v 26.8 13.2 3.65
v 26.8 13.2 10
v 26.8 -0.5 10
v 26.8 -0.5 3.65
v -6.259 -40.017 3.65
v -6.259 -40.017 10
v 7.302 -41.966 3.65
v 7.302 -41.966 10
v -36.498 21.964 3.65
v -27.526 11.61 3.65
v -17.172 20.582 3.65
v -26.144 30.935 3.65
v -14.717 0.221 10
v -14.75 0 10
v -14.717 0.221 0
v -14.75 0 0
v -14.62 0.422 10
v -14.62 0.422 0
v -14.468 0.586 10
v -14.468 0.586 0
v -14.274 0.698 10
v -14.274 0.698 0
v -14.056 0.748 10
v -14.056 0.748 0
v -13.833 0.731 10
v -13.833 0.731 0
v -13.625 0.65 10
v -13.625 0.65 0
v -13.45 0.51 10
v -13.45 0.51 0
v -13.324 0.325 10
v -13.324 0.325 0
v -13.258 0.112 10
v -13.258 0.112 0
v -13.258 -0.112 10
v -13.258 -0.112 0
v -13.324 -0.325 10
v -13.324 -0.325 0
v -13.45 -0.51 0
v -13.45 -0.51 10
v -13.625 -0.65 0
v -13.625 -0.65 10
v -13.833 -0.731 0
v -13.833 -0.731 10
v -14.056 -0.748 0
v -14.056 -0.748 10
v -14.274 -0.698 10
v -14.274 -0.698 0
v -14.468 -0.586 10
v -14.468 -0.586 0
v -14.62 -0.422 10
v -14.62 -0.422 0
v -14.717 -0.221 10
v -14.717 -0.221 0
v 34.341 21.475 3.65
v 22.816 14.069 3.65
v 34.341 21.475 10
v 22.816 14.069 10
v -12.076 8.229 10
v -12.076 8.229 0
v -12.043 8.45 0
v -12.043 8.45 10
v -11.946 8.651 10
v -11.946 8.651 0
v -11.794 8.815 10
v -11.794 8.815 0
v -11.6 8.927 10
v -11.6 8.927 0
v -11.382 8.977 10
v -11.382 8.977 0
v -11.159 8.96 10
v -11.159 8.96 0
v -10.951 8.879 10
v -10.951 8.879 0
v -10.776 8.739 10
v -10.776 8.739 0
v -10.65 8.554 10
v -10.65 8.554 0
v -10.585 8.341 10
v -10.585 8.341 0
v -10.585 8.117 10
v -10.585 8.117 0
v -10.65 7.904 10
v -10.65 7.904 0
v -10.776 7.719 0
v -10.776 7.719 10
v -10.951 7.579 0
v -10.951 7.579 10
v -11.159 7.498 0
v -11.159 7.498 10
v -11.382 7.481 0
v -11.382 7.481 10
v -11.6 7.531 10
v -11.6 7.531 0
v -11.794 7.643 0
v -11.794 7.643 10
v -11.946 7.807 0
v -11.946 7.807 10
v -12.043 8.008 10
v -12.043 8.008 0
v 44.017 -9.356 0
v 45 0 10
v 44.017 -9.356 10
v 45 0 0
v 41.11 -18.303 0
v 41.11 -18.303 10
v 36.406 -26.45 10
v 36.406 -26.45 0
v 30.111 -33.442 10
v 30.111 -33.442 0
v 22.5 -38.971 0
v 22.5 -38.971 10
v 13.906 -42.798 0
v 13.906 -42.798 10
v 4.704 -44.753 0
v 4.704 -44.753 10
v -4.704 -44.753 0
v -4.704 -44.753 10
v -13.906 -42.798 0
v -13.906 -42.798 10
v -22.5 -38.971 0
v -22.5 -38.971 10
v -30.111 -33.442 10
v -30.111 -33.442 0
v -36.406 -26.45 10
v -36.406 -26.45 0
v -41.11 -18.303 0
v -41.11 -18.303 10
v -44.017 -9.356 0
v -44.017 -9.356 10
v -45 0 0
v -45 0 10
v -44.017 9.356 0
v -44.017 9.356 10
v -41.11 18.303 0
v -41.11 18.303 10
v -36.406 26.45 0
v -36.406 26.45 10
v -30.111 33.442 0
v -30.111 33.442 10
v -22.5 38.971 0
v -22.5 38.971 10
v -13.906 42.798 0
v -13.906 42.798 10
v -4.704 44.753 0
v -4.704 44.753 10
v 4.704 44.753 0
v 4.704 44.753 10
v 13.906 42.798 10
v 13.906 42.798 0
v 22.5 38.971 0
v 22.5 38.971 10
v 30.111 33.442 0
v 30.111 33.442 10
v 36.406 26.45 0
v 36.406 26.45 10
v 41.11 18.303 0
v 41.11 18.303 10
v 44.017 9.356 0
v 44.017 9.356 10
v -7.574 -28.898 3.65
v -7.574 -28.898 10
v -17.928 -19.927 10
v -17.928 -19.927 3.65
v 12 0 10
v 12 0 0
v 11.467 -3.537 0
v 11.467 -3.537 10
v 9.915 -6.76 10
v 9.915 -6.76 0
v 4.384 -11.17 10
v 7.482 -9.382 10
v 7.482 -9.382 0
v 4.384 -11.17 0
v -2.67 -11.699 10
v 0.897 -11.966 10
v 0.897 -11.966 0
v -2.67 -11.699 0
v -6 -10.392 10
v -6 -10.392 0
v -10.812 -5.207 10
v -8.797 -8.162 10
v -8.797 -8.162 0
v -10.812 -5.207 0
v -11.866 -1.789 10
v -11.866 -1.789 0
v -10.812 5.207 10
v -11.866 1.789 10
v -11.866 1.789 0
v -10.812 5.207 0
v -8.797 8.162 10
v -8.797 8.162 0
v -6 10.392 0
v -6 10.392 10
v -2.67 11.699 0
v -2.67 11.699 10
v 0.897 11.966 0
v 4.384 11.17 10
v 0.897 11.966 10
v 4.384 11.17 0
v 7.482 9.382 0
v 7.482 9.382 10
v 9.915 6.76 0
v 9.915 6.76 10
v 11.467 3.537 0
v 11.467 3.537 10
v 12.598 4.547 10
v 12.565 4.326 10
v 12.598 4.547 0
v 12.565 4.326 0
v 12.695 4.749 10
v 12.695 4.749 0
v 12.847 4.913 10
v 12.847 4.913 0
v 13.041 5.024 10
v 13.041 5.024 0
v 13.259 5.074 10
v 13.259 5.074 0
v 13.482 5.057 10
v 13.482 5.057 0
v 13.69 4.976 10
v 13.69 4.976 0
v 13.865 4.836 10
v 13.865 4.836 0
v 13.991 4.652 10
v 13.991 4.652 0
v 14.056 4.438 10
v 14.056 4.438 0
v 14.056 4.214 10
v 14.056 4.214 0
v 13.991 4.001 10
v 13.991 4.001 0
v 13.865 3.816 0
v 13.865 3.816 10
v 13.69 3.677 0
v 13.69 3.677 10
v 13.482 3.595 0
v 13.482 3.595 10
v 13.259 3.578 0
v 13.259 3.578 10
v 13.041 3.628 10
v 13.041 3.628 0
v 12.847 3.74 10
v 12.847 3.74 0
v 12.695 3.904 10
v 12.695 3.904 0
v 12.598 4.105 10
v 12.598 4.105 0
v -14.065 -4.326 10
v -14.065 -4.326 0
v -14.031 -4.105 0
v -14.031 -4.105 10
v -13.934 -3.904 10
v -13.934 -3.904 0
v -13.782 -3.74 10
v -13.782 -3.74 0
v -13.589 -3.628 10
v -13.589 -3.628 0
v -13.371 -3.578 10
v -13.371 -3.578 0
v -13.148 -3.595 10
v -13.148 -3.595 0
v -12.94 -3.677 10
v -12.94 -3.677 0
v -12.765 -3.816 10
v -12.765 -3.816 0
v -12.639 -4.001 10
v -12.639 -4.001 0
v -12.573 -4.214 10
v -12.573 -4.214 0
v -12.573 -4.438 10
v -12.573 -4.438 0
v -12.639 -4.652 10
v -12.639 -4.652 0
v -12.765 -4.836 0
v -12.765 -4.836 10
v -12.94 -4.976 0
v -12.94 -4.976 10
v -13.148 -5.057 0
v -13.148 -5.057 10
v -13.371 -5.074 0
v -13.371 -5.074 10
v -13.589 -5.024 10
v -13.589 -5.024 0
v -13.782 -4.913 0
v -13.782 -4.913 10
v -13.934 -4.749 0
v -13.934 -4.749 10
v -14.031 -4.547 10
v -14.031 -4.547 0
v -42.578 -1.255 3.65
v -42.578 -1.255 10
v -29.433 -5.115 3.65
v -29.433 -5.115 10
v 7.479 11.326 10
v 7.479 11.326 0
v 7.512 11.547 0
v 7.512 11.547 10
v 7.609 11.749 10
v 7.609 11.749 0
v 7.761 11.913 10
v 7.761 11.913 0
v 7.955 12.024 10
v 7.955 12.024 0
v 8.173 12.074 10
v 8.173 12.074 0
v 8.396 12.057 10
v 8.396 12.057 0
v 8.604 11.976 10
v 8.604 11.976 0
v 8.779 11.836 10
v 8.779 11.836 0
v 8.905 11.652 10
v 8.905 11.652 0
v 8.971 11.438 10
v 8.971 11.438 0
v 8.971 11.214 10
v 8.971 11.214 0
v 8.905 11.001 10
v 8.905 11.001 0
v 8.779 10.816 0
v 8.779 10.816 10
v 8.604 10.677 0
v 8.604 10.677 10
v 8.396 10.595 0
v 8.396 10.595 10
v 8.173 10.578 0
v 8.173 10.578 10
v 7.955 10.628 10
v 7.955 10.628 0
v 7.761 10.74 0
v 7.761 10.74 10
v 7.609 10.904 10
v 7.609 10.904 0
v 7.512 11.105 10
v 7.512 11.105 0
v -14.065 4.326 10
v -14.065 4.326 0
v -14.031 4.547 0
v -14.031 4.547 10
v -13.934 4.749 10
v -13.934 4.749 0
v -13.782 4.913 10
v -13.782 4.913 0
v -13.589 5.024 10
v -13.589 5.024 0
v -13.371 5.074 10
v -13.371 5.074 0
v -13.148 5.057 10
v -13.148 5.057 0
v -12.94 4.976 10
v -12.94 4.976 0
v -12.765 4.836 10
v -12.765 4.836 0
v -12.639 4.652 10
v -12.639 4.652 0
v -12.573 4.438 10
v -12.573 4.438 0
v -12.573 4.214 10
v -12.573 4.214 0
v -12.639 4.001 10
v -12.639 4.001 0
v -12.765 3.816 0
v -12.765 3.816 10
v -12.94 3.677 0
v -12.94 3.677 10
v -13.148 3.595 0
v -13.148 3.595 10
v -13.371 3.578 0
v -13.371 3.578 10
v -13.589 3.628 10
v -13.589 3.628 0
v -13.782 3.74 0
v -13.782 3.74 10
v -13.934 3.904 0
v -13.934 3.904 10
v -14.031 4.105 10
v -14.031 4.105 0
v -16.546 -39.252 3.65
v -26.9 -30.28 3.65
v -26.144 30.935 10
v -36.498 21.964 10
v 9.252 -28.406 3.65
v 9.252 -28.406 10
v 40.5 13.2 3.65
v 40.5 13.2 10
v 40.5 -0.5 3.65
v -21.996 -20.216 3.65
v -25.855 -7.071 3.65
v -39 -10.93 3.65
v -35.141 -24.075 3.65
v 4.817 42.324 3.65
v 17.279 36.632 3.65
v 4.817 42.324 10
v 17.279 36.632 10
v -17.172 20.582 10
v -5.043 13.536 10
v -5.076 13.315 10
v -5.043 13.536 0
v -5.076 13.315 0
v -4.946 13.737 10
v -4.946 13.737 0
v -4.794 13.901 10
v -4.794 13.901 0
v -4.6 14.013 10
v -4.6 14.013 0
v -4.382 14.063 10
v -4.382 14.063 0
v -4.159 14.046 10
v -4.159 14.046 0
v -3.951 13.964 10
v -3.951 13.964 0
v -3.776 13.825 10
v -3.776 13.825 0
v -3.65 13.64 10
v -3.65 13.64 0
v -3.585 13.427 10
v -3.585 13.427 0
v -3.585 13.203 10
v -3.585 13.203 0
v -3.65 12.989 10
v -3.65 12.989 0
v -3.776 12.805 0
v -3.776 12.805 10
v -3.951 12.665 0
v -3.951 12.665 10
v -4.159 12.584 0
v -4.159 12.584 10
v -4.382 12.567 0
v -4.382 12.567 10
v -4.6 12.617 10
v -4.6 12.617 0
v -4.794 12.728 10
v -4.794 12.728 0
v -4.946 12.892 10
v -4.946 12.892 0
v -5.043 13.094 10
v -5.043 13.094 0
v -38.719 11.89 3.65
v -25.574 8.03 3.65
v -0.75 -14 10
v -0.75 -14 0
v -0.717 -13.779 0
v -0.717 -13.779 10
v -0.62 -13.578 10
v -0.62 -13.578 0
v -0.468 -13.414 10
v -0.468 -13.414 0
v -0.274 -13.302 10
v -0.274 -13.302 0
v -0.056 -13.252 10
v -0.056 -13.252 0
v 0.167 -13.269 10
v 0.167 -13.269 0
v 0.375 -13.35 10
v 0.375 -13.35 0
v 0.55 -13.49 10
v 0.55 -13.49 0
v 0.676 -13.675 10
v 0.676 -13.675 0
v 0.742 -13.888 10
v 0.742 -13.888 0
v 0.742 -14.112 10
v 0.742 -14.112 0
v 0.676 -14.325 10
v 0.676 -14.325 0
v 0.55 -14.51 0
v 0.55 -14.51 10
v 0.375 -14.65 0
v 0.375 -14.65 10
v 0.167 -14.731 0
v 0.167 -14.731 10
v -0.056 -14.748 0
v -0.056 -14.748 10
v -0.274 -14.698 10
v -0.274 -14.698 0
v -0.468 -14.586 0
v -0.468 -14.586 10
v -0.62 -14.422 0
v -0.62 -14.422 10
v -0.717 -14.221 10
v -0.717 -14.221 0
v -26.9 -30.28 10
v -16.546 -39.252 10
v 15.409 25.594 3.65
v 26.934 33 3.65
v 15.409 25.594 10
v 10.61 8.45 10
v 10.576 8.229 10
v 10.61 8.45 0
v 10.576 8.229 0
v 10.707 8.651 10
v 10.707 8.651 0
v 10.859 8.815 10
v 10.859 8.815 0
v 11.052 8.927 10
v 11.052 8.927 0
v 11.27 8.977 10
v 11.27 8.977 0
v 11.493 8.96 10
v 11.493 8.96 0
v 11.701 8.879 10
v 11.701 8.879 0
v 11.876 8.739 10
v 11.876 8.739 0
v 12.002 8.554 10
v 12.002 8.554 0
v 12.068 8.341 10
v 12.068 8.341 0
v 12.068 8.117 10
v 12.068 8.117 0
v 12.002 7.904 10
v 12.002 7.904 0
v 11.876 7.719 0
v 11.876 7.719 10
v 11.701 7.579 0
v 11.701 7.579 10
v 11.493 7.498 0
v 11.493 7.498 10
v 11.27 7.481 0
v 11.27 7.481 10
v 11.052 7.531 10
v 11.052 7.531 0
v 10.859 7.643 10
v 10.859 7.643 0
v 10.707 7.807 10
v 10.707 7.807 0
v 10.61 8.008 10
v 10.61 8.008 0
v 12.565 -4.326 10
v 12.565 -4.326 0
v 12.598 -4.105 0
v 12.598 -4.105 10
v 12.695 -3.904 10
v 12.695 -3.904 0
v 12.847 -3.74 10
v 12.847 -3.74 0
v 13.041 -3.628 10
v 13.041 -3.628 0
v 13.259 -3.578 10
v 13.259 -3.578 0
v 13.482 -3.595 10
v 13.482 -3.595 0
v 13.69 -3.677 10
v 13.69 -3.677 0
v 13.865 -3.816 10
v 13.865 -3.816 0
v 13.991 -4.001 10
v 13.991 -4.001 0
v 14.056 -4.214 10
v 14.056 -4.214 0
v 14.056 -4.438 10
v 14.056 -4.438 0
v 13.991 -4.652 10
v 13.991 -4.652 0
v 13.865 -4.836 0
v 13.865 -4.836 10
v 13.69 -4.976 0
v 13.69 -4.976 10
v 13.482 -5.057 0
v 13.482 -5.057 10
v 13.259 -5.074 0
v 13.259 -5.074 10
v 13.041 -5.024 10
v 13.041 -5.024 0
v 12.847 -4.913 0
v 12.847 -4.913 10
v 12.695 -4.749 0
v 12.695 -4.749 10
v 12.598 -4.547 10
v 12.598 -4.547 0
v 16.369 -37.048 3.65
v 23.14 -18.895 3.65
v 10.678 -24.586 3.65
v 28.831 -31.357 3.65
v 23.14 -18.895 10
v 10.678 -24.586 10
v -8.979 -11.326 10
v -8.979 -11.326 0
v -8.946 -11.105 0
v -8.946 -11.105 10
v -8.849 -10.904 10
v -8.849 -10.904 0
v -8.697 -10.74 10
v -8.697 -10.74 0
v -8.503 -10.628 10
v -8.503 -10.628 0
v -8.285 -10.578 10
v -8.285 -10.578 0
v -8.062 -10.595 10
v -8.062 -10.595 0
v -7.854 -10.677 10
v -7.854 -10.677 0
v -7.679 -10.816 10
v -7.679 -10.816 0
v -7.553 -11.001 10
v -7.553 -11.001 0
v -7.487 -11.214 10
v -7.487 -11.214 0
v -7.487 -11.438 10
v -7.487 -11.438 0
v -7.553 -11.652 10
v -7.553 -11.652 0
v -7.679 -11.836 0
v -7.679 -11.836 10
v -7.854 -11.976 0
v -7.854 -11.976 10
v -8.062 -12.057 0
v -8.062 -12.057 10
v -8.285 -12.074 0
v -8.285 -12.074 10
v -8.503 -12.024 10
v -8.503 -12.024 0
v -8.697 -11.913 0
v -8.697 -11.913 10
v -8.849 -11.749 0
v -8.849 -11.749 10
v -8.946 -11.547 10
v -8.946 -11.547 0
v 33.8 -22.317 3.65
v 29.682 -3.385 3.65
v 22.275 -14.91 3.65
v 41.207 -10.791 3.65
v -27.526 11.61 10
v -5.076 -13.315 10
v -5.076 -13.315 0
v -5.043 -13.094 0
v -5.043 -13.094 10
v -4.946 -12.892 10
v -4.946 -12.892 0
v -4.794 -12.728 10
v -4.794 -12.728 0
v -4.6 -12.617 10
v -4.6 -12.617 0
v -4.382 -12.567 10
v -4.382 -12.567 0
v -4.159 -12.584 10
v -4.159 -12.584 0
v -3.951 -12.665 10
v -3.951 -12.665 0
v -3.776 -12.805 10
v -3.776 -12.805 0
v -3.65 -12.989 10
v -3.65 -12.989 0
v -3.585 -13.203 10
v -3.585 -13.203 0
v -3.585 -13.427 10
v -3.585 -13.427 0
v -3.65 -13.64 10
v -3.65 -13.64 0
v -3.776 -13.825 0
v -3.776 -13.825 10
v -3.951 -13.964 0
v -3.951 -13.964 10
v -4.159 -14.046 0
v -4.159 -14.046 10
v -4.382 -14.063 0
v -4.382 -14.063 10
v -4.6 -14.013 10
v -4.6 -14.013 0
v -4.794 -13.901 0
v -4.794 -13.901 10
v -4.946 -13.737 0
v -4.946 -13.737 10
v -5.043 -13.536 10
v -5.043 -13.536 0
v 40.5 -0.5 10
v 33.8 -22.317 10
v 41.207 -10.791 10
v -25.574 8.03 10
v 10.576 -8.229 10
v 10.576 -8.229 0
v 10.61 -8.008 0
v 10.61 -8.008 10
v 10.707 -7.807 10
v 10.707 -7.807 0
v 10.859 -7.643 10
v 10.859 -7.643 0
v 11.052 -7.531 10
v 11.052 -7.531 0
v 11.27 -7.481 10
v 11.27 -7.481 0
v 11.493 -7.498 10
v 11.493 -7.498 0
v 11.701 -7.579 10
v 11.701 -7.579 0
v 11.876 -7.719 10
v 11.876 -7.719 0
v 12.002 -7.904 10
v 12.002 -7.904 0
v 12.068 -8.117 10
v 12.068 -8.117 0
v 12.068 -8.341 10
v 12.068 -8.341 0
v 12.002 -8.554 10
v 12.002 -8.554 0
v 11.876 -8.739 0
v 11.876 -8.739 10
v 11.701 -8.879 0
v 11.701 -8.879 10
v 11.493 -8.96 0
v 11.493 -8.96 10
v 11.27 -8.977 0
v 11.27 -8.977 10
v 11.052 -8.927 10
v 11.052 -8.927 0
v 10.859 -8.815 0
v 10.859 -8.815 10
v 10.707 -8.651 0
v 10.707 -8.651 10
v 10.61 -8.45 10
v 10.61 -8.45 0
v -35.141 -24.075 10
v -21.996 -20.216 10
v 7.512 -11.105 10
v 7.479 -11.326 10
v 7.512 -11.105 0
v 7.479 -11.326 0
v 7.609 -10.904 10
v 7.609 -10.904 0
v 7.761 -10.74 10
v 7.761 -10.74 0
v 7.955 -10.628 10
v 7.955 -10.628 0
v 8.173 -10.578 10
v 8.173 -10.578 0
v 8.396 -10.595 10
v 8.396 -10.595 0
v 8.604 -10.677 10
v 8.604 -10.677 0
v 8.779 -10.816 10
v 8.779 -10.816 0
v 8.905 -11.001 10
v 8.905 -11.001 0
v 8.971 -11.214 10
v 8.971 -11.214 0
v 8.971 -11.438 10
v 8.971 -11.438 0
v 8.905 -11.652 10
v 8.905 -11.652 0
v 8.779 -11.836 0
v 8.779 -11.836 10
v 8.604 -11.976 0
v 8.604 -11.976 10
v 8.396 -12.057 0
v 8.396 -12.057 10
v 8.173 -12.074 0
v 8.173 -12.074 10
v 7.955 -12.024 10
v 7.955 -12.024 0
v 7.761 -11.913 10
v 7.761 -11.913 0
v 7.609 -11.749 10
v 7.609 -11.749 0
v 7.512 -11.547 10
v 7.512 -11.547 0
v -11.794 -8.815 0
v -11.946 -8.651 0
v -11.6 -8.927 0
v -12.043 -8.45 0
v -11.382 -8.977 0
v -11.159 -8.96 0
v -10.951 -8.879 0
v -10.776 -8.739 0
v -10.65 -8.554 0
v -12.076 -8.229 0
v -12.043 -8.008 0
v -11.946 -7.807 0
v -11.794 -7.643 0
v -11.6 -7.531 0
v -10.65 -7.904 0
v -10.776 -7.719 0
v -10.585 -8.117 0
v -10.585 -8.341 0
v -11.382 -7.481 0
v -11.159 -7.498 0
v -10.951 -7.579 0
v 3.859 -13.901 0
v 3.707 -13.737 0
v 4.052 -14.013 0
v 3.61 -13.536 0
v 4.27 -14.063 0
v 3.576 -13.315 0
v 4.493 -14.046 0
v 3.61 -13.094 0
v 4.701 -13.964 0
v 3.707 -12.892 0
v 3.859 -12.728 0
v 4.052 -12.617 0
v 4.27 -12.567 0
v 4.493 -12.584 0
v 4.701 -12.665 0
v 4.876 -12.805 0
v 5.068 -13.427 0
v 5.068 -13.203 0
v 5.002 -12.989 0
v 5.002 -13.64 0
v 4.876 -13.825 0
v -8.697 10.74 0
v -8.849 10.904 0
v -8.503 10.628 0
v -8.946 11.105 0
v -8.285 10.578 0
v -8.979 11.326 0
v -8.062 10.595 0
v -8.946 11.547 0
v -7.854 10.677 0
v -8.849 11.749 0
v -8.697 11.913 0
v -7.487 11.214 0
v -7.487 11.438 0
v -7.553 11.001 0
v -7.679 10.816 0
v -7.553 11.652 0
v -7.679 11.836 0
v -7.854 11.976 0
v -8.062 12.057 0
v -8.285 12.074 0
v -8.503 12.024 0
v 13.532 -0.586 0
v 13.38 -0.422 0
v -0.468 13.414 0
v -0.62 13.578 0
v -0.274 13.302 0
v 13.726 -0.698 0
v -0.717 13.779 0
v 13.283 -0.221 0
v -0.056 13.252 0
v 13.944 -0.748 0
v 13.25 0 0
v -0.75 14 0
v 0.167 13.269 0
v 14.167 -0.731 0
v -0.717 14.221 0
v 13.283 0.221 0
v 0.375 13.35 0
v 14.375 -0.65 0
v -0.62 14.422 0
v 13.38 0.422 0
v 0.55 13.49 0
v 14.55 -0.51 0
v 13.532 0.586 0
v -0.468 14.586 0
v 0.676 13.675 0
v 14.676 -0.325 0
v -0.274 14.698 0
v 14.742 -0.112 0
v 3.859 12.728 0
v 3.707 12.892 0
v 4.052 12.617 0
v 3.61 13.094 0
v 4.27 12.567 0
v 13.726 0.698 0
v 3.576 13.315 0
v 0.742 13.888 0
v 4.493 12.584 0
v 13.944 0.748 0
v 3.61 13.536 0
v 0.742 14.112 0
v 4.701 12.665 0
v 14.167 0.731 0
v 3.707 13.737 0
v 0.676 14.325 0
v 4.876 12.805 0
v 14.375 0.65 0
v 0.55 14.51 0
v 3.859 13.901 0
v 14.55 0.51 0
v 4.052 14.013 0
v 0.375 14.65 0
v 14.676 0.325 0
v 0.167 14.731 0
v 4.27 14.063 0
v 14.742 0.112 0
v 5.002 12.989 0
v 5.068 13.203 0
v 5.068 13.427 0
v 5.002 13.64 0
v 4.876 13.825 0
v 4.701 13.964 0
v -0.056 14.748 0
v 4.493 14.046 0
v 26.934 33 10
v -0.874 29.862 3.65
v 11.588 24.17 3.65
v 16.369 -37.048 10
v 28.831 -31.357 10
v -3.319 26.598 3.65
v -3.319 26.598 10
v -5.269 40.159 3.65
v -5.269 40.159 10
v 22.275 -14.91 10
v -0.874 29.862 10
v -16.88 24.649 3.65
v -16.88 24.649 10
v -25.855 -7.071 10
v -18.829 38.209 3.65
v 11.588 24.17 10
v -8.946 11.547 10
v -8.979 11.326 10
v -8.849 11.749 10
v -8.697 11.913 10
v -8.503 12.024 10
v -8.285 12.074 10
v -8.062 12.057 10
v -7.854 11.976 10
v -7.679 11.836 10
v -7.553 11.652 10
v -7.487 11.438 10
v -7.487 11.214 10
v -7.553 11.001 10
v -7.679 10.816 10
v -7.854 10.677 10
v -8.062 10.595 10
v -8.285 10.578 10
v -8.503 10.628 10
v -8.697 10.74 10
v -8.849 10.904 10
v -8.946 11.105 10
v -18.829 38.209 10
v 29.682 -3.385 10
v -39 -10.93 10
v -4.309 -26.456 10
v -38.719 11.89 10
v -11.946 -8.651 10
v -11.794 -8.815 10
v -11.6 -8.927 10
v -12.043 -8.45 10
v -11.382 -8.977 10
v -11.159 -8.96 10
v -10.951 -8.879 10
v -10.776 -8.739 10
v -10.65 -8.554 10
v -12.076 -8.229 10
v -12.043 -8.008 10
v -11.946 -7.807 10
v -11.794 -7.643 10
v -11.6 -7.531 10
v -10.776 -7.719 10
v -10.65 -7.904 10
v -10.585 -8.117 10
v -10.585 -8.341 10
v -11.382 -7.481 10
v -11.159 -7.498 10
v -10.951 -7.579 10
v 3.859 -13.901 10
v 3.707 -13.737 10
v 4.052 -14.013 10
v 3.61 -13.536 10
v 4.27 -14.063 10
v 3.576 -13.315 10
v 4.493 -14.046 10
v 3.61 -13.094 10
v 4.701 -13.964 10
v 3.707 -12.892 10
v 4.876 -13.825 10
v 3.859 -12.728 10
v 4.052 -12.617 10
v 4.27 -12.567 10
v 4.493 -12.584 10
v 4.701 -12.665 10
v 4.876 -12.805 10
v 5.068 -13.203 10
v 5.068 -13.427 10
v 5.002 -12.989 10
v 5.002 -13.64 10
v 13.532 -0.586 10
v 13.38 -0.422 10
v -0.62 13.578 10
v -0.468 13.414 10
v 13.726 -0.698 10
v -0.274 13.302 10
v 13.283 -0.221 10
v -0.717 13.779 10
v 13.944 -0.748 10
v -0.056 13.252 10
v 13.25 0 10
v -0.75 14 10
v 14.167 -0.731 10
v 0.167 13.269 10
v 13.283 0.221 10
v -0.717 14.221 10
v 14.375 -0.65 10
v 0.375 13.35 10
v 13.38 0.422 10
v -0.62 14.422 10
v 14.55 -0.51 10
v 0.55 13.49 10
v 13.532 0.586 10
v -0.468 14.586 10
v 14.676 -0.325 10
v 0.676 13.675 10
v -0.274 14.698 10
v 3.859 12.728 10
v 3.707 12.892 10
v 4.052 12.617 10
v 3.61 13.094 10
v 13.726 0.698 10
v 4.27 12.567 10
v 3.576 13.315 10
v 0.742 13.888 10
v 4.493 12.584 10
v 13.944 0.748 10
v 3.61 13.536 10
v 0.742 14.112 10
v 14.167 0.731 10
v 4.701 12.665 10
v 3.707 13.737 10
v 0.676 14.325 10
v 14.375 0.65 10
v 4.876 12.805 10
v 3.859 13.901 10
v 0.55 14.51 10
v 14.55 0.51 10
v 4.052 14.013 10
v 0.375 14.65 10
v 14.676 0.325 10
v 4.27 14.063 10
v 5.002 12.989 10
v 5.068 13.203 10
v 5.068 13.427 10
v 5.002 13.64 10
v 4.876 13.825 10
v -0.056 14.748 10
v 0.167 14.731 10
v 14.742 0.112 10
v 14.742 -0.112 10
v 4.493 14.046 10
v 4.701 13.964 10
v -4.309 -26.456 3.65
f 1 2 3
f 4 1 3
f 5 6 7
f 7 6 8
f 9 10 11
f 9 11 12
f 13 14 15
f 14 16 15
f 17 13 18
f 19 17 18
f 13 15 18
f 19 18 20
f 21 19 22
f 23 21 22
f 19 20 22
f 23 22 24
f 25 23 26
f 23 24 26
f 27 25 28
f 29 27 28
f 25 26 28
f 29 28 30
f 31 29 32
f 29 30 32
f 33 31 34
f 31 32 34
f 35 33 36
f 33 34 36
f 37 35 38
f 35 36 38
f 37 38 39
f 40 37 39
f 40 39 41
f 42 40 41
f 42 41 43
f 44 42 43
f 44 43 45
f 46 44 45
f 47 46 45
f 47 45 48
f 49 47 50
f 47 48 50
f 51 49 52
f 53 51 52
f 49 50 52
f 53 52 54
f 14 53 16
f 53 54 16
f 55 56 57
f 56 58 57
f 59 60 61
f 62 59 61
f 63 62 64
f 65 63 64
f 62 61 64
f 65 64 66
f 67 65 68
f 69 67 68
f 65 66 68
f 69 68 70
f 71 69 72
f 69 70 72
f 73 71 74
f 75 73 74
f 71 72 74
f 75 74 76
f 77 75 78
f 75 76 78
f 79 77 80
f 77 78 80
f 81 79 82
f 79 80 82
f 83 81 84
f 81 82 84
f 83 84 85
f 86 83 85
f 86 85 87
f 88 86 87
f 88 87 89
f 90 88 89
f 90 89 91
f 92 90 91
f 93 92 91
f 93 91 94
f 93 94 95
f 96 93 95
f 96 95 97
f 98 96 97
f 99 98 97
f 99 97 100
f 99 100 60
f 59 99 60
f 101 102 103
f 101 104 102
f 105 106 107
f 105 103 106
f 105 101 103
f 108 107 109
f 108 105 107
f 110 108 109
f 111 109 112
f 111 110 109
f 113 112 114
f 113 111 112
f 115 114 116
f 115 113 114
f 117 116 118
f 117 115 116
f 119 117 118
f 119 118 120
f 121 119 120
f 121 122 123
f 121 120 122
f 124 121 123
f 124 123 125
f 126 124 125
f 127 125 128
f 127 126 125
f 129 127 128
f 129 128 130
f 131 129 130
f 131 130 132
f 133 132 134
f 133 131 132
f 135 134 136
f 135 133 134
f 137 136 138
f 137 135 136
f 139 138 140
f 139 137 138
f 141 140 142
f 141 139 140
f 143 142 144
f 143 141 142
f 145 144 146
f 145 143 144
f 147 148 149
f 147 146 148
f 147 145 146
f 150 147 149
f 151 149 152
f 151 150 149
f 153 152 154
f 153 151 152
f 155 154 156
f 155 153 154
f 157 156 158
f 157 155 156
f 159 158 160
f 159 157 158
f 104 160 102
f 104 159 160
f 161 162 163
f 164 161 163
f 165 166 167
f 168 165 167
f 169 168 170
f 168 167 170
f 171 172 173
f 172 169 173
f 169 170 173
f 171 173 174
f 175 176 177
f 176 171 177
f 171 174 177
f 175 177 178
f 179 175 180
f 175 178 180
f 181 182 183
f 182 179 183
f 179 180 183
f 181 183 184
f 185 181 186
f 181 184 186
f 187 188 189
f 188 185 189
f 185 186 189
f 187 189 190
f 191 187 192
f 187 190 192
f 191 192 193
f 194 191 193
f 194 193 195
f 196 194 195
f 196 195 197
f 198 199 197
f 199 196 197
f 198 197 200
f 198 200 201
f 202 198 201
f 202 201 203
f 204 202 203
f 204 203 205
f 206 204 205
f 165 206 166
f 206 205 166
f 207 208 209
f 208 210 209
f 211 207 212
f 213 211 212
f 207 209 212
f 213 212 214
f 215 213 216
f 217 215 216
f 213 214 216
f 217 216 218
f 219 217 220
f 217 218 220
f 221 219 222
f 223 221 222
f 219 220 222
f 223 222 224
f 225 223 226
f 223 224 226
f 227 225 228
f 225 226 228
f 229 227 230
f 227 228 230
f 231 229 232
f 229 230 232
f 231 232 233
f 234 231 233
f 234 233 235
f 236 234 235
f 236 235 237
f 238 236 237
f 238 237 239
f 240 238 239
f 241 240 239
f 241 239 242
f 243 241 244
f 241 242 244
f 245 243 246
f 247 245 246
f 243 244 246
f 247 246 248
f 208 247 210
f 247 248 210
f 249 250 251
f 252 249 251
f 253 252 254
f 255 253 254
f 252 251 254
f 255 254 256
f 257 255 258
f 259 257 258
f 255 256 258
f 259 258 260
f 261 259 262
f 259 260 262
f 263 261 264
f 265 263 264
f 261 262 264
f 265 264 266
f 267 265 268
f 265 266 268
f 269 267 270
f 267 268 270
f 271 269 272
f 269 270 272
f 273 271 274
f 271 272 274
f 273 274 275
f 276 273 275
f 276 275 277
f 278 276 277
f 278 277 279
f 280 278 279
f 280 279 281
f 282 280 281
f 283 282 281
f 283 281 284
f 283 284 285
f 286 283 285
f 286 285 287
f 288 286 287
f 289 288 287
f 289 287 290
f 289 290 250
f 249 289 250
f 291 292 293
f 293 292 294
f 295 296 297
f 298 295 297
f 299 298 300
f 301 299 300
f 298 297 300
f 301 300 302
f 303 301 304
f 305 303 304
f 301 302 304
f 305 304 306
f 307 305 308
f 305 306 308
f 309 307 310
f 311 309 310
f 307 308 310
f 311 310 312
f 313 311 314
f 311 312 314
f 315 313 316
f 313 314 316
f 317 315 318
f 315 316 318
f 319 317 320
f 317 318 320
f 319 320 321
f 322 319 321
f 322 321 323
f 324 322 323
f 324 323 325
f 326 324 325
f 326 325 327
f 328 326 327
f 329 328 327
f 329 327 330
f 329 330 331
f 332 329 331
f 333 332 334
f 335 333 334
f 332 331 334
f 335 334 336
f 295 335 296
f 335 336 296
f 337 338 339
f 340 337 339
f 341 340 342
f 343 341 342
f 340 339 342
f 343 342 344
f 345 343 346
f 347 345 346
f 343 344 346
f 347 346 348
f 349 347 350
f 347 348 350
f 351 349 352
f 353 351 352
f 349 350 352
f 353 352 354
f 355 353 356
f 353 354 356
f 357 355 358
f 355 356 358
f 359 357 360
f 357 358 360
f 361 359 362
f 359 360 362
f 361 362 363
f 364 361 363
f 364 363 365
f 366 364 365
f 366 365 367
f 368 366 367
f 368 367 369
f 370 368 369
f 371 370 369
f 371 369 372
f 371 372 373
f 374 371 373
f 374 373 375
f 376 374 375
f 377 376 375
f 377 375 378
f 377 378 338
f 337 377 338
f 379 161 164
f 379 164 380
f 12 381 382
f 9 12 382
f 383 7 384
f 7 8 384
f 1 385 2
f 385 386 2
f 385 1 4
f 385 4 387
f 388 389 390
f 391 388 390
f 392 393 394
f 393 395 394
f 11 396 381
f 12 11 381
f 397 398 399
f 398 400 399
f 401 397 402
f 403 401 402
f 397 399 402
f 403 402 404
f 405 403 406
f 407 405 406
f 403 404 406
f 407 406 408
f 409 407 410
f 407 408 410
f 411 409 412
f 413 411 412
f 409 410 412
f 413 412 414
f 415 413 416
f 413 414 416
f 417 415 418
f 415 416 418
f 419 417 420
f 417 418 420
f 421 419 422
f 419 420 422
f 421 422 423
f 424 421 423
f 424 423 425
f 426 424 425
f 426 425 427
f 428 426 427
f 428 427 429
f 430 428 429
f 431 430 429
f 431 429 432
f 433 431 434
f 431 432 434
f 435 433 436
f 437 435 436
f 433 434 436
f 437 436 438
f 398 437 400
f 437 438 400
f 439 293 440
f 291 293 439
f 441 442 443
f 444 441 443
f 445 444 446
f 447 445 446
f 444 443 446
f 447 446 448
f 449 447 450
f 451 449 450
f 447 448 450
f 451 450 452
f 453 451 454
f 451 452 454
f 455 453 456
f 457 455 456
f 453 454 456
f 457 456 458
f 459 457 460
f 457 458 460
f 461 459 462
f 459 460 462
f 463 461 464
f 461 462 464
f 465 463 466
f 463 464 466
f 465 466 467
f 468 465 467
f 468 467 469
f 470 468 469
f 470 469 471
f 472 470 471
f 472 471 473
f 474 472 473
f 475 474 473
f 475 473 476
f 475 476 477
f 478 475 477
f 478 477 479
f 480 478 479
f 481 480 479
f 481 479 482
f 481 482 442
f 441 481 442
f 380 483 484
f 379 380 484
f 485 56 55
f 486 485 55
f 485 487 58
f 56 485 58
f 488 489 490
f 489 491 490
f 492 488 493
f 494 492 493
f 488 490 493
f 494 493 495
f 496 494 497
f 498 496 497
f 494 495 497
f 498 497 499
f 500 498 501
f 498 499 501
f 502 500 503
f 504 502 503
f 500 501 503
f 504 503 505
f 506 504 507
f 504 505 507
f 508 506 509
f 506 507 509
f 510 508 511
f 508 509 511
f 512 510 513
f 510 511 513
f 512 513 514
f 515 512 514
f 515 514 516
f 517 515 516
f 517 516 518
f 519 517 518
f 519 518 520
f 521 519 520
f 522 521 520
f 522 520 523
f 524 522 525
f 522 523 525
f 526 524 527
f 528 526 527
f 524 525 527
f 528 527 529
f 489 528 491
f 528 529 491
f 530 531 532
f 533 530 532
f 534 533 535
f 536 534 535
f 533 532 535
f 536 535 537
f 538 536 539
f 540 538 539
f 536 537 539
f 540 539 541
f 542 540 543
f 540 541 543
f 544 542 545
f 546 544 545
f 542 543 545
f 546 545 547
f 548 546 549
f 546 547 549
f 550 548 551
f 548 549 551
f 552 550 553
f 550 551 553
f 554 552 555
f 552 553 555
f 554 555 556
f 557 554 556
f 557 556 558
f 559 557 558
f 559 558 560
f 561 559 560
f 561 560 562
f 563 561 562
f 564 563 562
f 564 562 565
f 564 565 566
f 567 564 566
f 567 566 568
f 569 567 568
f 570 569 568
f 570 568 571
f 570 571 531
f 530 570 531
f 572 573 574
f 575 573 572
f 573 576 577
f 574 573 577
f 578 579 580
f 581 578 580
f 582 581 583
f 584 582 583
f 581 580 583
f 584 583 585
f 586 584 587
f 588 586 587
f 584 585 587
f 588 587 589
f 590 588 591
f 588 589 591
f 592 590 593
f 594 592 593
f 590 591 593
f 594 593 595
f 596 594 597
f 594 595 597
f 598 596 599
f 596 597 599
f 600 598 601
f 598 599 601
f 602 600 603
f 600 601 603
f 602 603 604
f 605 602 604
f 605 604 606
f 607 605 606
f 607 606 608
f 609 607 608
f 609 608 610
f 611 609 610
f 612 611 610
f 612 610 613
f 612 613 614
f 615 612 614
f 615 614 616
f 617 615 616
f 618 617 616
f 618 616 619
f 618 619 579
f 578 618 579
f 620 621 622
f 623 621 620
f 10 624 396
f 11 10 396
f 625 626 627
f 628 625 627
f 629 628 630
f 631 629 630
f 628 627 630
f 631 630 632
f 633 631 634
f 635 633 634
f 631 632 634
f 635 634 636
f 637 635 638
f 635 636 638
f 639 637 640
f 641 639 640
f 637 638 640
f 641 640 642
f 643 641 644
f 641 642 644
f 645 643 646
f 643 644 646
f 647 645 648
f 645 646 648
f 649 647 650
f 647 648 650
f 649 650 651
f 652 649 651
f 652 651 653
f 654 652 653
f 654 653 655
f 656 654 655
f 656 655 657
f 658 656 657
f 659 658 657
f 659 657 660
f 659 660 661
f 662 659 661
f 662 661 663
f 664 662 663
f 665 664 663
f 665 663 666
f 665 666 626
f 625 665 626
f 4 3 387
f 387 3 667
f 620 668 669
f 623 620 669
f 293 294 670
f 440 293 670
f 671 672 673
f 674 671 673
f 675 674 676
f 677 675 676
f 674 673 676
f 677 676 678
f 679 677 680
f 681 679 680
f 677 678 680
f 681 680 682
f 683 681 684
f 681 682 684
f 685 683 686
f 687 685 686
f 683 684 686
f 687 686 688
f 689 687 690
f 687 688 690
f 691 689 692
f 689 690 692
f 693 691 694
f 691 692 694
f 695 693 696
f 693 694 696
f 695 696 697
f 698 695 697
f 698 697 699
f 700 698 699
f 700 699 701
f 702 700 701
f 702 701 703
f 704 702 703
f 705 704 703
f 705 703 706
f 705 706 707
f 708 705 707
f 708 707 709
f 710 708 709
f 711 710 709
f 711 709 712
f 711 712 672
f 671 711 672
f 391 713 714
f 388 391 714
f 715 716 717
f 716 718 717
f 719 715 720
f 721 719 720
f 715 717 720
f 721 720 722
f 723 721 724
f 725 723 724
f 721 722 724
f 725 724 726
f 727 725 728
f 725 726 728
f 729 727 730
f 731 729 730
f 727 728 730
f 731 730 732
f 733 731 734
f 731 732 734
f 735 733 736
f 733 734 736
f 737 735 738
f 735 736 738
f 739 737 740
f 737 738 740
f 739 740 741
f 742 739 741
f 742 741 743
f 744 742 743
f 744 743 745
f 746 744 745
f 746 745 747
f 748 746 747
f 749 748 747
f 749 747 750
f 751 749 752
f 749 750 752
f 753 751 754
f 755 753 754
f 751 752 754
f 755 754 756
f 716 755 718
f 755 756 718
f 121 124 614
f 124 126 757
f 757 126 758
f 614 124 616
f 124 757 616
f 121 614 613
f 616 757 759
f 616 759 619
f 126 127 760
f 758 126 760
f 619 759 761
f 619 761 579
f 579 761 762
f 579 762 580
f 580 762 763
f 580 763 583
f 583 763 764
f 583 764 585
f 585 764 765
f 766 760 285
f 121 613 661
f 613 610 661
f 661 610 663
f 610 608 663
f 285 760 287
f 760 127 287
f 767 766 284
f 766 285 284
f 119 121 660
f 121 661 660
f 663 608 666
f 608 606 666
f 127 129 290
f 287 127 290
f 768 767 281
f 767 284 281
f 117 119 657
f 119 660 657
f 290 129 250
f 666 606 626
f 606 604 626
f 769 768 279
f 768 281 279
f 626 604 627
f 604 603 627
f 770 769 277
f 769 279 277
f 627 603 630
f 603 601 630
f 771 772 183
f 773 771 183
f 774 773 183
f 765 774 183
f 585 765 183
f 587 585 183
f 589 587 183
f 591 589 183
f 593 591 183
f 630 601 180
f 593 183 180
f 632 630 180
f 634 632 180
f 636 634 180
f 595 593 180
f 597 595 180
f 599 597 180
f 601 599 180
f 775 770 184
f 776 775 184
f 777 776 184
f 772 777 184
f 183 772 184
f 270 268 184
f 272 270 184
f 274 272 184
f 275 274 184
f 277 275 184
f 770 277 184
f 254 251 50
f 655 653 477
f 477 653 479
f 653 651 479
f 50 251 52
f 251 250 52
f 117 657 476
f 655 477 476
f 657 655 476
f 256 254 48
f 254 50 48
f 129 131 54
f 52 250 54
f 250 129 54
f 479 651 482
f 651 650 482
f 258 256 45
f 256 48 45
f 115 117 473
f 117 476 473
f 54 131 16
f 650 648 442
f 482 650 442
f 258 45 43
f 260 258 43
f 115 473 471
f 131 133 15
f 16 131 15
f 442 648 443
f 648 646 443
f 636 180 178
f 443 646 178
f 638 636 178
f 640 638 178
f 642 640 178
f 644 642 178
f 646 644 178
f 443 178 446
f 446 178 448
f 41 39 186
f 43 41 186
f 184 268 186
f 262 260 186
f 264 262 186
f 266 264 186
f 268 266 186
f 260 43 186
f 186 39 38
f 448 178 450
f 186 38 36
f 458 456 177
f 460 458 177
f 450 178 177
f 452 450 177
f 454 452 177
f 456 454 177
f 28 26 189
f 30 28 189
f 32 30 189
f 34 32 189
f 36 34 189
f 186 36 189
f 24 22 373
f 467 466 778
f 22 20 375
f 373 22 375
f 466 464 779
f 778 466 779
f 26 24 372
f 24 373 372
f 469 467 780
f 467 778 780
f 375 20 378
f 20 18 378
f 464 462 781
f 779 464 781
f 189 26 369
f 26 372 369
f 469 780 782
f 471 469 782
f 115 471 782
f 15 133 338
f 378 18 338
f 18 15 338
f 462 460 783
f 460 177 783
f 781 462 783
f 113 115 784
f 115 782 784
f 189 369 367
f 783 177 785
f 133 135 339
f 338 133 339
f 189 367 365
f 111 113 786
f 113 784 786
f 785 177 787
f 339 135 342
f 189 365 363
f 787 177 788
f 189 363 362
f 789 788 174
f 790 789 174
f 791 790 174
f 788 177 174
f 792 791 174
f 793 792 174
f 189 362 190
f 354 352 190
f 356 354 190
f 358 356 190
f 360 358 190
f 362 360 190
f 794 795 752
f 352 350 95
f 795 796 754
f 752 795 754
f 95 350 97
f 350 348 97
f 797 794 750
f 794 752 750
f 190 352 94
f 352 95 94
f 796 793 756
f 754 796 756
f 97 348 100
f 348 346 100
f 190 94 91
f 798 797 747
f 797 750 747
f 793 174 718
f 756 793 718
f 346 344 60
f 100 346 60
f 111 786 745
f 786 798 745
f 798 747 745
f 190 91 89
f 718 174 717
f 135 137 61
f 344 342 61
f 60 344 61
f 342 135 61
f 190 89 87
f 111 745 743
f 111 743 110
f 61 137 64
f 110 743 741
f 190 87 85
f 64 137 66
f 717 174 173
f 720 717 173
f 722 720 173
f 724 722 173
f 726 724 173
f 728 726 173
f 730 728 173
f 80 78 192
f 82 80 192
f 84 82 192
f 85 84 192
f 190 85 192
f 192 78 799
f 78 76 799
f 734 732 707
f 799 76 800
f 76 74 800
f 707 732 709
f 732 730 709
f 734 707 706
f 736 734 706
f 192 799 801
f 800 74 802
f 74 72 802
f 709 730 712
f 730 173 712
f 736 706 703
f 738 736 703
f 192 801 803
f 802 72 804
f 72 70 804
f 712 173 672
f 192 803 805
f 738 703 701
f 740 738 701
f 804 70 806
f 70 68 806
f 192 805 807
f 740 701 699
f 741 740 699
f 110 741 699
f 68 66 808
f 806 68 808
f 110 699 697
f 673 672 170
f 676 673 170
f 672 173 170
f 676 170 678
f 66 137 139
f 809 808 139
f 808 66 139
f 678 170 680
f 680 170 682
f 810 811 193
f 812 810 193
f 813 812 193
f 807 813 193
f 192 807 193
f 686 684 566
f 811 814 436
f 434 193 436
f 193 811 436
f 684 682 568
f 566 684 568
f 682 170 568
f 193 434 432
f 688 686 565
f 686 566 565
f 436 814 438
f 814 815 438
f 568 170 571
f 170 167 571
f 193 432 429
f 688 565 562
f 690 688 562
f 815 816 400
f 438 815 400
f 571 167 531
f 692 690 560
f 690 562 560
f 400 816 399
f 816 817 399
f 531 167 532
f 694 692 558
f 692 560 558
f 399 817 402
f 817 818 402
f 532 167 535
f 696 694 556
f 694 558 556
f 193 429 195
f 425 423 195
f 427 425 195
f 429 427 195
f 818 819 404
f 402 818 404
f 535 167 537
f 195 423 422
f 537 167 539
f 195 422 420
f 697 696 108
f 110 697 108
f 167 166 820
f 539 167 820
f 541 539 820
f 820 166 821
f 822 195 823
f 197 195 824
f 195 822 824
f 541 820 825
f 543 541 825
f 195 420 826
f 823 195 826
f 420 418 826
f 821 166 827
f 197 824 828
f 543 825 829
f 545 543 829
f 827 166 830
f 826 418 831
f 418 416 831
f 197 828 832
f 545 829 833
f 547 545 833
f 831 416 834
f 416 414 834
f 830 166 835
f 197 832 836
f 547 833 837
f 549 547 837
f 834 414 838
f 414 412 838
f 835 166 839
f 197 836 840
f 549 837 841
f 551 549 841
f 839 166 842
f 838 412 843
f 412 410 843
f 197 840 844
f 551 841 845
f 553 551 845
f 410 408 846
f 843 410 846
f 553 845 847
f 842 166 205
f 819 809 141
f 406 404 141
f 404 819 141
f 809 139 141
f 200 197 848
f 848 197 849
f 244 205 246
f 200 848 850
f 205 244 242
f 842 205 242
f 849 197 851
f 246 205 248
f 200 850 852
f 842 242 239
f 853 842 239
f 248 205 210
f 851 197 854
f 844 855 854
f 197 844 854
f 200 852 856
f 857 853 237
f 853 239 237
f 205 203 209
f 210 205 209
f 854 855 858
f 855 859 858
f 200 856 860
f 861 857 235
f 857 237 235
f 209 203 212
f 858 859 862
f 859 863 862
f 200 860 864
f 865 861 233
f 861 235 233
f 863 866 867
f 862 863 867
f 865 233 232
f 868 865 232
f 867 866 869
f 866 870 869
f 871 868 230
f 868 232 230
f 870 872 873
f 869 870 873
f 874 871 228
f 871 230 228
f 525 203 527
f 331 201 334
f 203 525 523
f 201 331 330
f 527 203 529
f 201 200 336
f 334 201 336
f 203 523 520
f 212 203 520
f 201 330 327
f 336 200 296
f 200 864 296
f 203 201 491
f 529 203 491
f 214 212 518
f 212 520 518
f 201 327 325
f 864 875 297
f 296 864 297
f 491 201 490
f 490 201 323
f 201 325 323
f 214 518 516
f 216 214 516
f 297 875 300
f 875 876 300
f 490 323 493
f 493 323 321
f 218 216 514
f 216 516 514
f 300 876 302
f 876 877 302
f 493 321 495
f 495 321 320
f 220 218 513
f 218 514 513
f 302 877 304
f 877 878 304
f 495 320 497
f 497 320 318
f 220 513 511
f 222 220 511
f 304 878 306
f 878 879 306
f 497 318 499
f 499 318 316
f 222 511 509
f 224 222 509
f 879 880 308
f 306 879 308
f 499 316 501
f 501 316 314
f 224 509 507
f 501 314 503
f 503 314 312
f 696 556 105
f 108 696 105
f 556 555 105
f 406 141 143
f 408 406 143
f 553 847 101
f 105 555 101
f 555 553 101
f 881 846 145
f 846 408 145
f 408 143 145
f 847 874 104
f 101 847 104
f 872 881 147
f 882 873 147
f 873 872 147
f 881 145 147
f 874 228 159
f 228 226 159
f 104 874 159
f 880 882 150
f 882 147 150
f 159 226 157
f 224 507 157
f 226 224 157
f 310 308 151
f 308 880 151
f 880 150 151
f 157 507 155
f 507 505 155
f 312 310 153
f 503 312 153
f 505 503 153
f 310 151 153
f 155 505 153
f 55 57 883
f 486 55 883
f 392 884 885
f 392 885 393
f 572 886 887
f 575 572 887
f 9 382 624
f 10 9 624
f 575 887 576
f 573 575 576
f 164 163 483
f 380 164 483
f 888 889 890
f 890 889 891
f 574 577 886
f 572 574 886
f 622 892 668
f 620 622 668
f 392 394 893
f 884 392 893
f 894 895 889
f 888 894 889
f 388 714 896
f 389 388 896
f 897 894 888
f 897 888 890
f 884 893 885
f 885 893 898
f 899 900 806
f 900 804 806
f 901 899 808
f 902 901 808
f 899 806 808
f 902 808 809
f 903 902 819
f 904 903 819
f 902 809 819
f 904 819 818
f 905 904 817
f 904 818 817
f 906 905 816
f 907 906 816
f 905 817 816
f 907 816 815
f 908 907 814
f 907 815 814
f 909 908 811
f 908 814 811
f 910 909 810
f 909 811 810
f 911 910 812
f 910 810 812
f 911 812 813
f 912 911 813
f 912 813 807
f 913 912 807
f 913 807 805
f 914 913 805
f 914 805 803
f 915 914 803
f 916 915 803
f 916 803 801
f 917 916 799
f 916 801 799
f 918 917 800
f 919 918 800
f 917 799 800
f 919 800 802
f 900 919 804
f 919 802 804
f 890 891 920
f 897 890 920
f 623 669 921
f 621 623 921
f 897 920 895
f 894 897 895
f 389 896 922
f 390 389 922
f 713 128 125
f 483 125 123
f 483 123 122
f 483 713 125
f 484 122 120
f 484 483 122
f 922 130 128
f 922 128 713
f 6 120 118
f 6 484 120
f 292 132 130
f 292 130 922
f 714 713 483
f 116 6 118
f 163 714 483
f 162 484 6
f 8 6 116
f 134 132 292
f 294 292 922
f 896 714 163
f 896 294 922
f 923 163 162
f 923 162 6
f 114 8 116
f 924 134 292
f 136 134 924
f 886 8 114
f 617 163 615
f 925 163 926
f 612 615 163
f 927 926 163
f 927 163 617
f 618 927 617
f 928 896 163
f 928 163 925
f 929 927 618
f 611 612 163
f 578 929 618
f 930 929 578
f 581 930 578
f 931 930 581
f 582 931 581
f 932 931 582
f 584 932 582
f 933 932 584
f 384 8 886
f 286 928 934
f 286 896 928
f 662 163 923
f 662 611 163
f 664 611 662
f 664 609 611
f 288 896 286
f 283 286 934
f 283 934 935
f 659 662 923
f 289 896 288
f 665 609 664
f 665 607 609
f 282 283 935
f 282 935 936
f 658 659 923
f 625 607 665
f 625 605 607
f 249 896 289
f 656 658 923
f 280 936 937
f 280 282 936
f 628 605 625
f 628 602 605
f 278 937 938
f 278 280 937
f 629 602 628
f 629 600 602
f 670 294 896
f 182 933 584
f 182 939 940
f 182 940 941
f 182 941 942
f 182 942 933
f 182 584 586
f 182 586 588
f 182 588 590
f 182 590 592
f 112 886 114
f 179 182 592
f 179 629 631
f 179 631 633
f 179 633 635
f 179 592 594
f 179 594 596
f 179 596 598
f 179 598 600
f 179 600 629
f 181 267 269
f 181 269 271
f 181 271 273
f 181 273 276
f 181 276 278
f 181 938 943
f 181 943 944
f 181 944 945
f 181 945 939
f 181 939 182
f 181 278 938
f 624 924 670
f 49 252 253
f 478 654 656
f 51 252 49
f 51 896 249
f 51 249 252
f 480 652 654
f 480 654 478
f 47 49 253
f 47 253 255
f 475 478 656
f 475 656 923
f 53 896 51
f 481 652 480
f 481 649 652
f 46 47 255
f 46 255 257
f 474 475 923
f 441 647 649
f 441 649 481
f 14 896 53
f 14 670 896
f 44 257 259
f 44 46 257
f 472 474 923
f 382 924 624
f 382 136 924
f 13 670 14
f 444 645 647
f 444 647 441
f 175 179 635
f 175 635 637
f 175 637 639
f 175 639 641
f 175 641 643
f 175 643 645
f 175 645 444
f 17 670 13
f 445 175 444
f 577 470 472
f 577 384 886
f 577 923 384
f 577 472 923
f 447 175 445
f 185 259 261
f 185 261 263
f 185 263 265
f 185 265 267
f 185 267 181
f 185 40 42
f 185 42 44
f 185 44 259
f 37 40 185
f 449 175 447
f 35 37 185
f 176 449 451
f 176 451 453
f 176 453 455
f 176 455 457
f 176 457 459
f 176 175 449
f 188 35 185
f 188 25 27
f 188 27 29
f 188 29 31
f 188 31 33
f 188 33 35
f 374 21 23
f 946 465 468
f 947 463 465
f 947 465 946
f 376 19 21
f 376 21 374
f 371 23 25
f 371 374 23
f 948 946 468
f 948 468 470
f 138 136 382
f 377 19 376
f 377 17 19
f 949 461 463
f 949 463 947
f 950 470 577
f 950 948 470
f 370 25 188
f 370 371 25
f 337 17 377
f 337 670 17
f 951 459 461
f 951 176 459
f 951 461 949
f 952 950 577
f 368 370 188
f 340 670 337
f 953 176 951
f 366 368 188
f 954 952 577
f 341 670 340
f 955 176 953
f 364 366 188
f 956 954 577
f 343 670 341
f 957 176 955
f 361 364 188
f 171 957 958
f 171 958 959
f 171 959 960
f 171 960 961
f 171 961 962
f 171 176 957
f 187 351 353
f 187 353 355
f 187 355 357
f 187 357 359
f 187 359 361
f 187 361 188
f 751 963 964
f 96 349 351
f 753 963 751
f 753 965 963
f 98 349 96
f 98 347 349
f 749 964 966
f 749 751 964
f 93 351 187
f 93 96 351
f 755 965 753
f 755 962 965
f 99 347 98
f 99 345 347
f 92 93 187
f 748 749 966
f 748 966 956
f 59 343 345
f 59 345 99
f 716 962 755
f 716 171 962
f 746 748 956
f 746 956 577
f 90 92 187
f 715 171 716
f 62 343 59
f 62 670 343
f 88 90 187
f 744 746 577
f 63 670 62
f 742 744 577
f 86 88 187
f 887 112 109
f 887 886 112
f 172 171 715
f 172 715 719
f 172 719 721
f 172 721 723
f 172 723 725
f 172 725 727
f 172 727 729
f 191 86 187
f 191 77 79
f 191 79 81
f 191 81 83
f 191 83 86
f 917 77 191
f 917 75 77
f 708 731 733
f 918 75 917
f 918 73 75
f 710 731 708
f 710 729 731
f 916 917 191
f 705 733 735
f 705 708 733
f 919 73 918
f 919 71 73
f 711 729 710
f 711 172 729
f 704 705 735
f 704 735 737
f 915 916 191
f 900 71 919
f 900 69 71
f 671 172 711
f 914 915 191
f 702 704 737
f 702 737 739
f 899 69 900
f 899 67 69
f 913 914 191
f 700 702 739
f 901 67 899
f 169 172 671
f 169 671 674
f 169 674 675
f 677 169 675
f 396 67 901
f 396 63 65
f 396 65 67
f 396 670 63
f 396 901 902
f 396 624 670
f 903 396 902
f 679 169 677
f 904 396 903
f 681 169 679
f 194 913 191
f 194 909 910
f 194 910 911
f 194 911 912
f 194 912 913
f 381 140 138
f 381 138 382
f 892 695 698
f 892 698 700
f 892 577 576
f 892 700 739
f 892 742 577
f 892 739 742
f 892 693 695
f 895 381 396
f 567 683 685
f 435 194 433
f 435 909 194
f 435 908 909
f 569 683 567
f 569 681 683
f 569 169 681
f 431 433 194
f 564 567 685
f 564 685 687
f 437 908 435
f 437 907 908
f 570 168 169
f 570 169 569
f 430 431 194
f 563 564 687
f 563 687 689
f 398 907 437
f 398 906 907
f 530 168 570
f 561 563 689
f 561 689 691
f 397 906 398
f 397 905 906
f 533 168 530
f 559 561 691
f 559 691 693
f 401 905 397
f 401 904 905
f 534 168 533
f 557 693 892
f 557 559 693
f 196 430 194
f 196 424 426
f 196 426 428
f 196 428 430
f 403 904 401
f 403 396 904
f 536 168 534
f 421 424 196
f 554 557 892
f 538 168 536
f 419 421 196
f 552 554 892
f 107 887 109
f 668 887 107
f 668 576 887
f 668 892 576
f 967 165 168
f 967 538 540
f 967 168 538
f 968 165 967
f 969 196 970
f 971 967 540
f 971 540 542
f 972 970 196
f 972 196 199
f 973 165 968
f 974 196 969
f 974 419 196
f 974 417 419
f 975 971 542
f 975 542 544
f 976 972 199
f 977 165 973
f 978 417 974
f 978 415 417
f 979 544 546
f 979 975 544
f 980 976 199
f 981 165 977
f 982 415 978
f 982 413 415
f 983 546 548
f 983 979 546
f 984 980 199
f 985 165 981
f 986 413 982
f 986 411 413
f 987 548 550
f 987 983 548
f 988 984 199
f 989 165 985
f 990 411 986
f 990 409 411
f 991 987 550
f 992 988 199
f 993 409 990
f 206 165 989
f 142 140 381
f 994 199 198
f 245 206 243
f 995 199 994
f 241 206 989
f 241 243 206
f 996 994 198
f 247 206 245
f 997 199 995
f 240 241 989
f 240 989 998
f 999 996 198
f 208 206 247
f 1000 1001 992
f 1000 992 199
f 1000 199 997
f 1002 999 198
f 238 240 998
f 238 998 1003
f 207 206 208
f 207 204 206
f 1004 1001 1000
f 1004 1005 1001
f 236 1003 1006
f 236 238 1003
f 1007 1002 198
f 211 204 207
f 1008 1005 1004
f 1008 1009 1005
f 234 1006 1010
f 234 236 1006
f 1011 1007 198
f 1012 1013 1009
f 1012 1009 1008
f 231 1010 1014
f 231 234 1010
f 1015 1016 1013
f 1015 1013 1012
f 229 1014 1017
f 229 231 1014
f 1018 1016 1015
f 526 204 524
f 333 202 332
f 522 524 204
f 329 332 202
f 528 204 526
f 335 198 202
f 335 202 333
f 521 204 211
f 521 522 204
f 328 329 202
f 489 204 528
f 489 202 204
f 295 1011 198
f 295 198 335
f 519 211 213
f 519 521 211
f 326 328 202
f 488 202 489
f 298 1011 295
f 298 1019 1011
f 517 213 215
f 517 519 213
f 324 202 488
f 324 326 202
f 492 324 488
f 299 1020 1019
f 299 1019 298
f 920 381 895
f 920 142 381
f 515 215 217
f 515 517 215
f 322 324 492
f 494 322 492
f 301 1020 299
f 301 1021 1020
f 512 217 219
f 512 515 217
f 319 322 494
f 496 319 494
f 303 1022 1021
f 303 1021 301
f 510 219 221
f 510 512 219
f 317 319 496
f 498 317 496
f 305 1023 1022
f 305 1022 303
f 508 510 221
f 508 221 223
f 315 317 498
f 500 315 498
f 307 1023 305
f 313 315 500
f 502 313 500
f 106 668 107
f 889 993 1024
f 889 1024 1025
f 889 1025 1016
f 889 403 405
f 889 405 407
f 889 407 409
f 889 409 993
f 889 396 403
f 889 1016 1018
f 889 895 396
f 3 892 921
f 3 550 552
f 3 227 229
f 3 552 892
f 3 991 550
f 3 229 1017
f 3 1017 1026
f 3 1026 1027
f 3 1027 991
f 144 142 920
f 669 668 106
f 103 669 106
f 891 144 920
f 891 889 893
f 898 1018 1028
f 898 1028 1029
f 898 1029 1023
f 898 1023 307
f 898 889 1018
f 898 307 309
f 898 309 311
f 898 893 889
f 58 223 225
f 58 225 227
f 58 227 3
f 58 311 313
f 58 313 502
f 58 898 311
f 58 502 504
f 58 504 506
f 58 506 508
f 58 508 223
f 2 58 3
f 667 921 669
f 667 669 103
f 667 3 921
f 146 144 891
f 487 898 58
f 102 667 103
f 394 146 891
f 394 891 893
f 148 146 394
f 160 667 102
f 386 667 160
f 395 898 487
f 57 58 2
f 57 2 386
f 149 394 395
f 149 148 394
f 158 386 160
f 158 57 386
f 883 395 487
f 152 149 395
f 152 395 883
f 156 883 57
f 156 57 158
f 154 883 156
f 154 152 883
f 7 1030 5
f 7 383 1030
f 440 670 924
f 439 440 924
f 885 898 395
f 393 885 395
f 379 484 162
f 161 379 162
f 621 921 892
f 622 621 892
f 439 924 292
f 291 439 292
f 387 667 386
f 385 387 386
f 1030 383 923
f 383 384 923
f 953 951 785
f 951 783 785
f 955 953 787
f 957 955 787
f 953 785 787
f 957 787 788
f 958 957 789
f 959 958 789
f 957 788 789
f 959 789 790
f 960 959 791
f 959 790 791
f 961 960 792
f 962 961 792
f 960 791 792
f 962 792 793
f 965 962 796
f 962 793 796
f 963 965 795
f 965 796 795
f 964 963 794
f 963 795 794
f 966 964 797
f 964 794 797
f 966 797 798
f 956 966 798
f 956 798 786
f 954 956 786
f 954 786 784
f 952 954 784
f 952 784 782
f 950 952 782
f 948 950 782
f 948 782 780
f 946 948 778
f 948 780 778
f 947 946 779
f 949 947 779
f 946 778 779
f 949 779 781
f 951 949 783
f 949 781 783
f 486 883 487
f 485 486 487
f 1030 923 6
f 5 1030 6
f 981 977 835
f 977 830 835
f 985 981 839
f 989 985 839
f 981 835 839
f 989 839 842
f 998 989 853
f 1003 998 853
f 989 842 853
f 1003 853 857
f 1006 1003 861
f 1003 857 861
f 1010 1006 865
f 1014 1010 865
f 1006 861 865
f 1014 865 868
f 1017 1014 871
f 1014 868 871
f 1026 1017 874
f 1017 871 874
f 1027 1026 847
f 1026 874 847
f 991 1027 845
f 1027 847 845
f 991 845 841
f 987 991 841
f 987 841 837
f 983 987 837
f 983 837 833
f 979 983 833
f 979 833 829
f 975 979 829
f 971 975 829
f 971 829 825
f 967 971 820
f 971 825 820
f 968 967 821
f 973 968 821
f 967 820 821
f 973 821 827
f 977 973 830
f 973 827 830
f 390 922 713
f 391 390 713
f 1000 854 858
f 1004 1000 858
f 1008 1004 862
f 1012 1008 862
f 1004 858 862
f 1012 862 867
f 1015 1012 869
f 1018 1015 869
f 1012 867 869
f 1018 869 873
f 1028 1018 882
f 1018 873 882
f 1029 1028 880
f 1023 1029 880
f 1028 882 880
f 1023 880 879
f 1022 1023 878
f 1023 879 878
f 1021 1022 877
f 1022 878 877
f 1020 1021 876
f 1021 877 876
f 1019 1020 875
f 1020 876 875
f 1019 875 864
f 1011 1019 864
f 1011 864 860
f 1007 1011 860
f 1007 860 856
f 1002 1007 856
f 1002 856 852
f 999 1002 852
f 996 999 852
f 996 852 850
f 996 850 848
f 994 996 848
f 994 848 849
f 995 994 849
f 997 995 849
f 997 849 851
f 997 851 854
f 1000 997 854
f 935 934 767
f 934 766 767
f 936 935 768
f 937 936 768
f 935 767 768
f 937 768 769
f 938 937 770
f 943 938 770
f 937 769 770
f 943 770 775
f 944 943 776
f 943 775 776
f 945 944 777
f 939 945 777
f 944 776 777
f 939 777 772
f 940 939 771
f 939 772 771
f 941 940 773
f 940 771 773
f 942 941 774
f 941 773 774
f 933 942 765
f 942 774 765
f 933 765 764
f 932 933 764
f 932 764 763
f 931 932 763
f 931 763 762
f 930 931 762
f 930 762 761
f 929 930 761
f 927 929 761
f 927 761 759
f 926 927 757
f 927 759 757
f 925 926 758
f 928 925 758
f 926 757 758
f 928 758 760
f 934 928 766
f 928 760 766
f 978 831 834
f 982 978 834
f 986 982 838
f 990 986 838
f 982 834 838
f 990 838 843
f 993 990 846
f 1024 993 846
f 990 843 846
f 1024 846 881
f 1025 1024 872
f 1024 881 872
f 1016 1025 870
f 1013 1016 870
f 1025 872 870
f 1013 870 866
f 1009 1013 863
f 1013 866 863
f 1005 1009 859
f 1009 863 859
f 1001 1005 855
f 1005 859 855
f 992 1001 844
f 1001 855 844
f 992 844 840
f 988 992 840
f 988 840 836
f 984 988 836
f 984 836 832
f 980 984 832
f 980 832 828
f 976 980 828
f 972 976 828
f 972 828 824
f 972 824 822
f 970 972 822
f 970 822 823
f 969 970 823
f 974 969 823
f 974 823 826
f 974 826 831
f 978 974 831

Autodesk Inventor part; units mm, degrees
ref_plane "YZ Plane" through (0, 0, 0) normal (1, 0, 0) x (0, 1, 0)
ref_plane "XZ Plane" through (0, 0, 0) normal (0, 1, 0) x (-1, 0, 0)
ref_plane "XY Plane" through (0, 0, 0) normal (0, 0, 1) x (1, 0, 0)
sketch "Sketch1" plane through (0, 0, 0) normal (0, 0, 1) x (1, 0, 0)
  circle A0 centre (0, 0) radius 45
  circle A1 centre (0, 0) radius 12
  dimension "d0" = 90
  dimension "d1" = 24
extrude "Extrusion1" add sketch "Sketch1" along normal blind 10
sketch "Sketch2" plane through (0, 0, 10) normal (0, 0, 1) x (1, 0, 0)
  line L0 (27.3, 12.7) -> (40, 12.7)
  line L1 (40, 12.7) -> (40, 0)
  line L2 (40, 0) -> (27.3, 0)
  line L3 (27.3, 0) -> (27.3, 12.7)
  line L4 (40.5, 13.2) -> (26.8, 13.2)
  line L5 (26.8, 13.2) -> (26.8, -0.5)
  line L6 (26.8, -0.5) -> (40.5, -0.5)
  line L7 (40.5, -0.5) -> (40.5, 13.2)
  point P0 (0, 0)
  dimension "d4" = 12.7
  dimension "d5" = 12.7
  dimension "d6" = 40
  dimension "d7" = 0.5
extrude "Extrusion2" cut sketch "Sketch2" against normal blind 6.35 contours L0 L1 L2 L3 | L7 L6 L5 L4
pattern_circular "Circular Pattern1" count 11 over 360 about axis through (0, 0, 0) along (0, 0, 1) of "Extrusion2"
sketch "Sketch3" plane through (0, 0, 10) normal (0, 0, 1) x (1, 0, 0)
  circle A0 centre (20, 0) radius 1.75
  circle A1 centre (14.1421, 14.1421) radius 1.75
  circle A2 centre (0, 20) radius 1.75
  circle A3 centre (-14.1421, 14.1421) radius 1.75
  circle A4 centre (-20, 0) radius 1.75
  circle A5 centre (-14.1421, -14.1421) radius 1.75
  circle A6 centre (0, -20) radius 1.75
  circle A7 centre (14.1421, -14.1421) radius 1.75
  point P0 (0, 0)
  dimension "d13" = 3.5
  dimension "d14" = 20
  dimension "d17" = 360
extrude "Extrusion3" [suppressed]
sketch "Sketch6" plane through (0, 0, 0) normal (0, 0, -1) x (-1, 0, 0)
  circle A0 centre (0, 14) radius 0.75
  circle A1 centre (-4.3262, 13.3148) radius 0.75
  circle A2 centre (-8.229, 11.3262) radius 0.75
  circle A3 centre (-11.3262, 8.229) radius 0.75
  circle A4 centre (-13.3148, 4.3262) radius 0.75
  circle A5 centre (-14, 0) radius 0.75
  circle A6 centre (-13.3148, -4.3262) radius 0.75
  circle A7 centre (-11.3262, -8.229) radius 0.75
  circle A8 centre (-8.229, -11.3262) radius 0.75
  circle A9 centre (-4.3262, -13.3148) radius 0.75
  circle A10 centre (0, -14) radius 0.75
  circle A11 centre (4.3262, -13.3148) radius 0.75
  circle A12 centre (8.229, -11.3262) radius 0.75
  circle A13 centre (11.3262, -8.229) radius 0.75
  circle A14 centre (13.3148, -4.3262) radius 0.75
  circle A15 centre (14, 0) radius 0.75
  circle A16 centre (13.3148, 4.3262) radius 0.75
  circle A17 centre (11.3262, 8.229) radius 0.75
  circle A18 centre (8.229, 11.3262) radius 0.75
  circle A19 centre (4.3262, 13.3148) radius 0.75
  point P0 (0, 0)
  dimension "d24" = 1.5
  dimension "d25" = 14
  dimension "d28" = 360
extrude "Extrusion5" cut sketch "Sketch6" against normal through all
properties part number "SG01" material "ABS Plastic"
